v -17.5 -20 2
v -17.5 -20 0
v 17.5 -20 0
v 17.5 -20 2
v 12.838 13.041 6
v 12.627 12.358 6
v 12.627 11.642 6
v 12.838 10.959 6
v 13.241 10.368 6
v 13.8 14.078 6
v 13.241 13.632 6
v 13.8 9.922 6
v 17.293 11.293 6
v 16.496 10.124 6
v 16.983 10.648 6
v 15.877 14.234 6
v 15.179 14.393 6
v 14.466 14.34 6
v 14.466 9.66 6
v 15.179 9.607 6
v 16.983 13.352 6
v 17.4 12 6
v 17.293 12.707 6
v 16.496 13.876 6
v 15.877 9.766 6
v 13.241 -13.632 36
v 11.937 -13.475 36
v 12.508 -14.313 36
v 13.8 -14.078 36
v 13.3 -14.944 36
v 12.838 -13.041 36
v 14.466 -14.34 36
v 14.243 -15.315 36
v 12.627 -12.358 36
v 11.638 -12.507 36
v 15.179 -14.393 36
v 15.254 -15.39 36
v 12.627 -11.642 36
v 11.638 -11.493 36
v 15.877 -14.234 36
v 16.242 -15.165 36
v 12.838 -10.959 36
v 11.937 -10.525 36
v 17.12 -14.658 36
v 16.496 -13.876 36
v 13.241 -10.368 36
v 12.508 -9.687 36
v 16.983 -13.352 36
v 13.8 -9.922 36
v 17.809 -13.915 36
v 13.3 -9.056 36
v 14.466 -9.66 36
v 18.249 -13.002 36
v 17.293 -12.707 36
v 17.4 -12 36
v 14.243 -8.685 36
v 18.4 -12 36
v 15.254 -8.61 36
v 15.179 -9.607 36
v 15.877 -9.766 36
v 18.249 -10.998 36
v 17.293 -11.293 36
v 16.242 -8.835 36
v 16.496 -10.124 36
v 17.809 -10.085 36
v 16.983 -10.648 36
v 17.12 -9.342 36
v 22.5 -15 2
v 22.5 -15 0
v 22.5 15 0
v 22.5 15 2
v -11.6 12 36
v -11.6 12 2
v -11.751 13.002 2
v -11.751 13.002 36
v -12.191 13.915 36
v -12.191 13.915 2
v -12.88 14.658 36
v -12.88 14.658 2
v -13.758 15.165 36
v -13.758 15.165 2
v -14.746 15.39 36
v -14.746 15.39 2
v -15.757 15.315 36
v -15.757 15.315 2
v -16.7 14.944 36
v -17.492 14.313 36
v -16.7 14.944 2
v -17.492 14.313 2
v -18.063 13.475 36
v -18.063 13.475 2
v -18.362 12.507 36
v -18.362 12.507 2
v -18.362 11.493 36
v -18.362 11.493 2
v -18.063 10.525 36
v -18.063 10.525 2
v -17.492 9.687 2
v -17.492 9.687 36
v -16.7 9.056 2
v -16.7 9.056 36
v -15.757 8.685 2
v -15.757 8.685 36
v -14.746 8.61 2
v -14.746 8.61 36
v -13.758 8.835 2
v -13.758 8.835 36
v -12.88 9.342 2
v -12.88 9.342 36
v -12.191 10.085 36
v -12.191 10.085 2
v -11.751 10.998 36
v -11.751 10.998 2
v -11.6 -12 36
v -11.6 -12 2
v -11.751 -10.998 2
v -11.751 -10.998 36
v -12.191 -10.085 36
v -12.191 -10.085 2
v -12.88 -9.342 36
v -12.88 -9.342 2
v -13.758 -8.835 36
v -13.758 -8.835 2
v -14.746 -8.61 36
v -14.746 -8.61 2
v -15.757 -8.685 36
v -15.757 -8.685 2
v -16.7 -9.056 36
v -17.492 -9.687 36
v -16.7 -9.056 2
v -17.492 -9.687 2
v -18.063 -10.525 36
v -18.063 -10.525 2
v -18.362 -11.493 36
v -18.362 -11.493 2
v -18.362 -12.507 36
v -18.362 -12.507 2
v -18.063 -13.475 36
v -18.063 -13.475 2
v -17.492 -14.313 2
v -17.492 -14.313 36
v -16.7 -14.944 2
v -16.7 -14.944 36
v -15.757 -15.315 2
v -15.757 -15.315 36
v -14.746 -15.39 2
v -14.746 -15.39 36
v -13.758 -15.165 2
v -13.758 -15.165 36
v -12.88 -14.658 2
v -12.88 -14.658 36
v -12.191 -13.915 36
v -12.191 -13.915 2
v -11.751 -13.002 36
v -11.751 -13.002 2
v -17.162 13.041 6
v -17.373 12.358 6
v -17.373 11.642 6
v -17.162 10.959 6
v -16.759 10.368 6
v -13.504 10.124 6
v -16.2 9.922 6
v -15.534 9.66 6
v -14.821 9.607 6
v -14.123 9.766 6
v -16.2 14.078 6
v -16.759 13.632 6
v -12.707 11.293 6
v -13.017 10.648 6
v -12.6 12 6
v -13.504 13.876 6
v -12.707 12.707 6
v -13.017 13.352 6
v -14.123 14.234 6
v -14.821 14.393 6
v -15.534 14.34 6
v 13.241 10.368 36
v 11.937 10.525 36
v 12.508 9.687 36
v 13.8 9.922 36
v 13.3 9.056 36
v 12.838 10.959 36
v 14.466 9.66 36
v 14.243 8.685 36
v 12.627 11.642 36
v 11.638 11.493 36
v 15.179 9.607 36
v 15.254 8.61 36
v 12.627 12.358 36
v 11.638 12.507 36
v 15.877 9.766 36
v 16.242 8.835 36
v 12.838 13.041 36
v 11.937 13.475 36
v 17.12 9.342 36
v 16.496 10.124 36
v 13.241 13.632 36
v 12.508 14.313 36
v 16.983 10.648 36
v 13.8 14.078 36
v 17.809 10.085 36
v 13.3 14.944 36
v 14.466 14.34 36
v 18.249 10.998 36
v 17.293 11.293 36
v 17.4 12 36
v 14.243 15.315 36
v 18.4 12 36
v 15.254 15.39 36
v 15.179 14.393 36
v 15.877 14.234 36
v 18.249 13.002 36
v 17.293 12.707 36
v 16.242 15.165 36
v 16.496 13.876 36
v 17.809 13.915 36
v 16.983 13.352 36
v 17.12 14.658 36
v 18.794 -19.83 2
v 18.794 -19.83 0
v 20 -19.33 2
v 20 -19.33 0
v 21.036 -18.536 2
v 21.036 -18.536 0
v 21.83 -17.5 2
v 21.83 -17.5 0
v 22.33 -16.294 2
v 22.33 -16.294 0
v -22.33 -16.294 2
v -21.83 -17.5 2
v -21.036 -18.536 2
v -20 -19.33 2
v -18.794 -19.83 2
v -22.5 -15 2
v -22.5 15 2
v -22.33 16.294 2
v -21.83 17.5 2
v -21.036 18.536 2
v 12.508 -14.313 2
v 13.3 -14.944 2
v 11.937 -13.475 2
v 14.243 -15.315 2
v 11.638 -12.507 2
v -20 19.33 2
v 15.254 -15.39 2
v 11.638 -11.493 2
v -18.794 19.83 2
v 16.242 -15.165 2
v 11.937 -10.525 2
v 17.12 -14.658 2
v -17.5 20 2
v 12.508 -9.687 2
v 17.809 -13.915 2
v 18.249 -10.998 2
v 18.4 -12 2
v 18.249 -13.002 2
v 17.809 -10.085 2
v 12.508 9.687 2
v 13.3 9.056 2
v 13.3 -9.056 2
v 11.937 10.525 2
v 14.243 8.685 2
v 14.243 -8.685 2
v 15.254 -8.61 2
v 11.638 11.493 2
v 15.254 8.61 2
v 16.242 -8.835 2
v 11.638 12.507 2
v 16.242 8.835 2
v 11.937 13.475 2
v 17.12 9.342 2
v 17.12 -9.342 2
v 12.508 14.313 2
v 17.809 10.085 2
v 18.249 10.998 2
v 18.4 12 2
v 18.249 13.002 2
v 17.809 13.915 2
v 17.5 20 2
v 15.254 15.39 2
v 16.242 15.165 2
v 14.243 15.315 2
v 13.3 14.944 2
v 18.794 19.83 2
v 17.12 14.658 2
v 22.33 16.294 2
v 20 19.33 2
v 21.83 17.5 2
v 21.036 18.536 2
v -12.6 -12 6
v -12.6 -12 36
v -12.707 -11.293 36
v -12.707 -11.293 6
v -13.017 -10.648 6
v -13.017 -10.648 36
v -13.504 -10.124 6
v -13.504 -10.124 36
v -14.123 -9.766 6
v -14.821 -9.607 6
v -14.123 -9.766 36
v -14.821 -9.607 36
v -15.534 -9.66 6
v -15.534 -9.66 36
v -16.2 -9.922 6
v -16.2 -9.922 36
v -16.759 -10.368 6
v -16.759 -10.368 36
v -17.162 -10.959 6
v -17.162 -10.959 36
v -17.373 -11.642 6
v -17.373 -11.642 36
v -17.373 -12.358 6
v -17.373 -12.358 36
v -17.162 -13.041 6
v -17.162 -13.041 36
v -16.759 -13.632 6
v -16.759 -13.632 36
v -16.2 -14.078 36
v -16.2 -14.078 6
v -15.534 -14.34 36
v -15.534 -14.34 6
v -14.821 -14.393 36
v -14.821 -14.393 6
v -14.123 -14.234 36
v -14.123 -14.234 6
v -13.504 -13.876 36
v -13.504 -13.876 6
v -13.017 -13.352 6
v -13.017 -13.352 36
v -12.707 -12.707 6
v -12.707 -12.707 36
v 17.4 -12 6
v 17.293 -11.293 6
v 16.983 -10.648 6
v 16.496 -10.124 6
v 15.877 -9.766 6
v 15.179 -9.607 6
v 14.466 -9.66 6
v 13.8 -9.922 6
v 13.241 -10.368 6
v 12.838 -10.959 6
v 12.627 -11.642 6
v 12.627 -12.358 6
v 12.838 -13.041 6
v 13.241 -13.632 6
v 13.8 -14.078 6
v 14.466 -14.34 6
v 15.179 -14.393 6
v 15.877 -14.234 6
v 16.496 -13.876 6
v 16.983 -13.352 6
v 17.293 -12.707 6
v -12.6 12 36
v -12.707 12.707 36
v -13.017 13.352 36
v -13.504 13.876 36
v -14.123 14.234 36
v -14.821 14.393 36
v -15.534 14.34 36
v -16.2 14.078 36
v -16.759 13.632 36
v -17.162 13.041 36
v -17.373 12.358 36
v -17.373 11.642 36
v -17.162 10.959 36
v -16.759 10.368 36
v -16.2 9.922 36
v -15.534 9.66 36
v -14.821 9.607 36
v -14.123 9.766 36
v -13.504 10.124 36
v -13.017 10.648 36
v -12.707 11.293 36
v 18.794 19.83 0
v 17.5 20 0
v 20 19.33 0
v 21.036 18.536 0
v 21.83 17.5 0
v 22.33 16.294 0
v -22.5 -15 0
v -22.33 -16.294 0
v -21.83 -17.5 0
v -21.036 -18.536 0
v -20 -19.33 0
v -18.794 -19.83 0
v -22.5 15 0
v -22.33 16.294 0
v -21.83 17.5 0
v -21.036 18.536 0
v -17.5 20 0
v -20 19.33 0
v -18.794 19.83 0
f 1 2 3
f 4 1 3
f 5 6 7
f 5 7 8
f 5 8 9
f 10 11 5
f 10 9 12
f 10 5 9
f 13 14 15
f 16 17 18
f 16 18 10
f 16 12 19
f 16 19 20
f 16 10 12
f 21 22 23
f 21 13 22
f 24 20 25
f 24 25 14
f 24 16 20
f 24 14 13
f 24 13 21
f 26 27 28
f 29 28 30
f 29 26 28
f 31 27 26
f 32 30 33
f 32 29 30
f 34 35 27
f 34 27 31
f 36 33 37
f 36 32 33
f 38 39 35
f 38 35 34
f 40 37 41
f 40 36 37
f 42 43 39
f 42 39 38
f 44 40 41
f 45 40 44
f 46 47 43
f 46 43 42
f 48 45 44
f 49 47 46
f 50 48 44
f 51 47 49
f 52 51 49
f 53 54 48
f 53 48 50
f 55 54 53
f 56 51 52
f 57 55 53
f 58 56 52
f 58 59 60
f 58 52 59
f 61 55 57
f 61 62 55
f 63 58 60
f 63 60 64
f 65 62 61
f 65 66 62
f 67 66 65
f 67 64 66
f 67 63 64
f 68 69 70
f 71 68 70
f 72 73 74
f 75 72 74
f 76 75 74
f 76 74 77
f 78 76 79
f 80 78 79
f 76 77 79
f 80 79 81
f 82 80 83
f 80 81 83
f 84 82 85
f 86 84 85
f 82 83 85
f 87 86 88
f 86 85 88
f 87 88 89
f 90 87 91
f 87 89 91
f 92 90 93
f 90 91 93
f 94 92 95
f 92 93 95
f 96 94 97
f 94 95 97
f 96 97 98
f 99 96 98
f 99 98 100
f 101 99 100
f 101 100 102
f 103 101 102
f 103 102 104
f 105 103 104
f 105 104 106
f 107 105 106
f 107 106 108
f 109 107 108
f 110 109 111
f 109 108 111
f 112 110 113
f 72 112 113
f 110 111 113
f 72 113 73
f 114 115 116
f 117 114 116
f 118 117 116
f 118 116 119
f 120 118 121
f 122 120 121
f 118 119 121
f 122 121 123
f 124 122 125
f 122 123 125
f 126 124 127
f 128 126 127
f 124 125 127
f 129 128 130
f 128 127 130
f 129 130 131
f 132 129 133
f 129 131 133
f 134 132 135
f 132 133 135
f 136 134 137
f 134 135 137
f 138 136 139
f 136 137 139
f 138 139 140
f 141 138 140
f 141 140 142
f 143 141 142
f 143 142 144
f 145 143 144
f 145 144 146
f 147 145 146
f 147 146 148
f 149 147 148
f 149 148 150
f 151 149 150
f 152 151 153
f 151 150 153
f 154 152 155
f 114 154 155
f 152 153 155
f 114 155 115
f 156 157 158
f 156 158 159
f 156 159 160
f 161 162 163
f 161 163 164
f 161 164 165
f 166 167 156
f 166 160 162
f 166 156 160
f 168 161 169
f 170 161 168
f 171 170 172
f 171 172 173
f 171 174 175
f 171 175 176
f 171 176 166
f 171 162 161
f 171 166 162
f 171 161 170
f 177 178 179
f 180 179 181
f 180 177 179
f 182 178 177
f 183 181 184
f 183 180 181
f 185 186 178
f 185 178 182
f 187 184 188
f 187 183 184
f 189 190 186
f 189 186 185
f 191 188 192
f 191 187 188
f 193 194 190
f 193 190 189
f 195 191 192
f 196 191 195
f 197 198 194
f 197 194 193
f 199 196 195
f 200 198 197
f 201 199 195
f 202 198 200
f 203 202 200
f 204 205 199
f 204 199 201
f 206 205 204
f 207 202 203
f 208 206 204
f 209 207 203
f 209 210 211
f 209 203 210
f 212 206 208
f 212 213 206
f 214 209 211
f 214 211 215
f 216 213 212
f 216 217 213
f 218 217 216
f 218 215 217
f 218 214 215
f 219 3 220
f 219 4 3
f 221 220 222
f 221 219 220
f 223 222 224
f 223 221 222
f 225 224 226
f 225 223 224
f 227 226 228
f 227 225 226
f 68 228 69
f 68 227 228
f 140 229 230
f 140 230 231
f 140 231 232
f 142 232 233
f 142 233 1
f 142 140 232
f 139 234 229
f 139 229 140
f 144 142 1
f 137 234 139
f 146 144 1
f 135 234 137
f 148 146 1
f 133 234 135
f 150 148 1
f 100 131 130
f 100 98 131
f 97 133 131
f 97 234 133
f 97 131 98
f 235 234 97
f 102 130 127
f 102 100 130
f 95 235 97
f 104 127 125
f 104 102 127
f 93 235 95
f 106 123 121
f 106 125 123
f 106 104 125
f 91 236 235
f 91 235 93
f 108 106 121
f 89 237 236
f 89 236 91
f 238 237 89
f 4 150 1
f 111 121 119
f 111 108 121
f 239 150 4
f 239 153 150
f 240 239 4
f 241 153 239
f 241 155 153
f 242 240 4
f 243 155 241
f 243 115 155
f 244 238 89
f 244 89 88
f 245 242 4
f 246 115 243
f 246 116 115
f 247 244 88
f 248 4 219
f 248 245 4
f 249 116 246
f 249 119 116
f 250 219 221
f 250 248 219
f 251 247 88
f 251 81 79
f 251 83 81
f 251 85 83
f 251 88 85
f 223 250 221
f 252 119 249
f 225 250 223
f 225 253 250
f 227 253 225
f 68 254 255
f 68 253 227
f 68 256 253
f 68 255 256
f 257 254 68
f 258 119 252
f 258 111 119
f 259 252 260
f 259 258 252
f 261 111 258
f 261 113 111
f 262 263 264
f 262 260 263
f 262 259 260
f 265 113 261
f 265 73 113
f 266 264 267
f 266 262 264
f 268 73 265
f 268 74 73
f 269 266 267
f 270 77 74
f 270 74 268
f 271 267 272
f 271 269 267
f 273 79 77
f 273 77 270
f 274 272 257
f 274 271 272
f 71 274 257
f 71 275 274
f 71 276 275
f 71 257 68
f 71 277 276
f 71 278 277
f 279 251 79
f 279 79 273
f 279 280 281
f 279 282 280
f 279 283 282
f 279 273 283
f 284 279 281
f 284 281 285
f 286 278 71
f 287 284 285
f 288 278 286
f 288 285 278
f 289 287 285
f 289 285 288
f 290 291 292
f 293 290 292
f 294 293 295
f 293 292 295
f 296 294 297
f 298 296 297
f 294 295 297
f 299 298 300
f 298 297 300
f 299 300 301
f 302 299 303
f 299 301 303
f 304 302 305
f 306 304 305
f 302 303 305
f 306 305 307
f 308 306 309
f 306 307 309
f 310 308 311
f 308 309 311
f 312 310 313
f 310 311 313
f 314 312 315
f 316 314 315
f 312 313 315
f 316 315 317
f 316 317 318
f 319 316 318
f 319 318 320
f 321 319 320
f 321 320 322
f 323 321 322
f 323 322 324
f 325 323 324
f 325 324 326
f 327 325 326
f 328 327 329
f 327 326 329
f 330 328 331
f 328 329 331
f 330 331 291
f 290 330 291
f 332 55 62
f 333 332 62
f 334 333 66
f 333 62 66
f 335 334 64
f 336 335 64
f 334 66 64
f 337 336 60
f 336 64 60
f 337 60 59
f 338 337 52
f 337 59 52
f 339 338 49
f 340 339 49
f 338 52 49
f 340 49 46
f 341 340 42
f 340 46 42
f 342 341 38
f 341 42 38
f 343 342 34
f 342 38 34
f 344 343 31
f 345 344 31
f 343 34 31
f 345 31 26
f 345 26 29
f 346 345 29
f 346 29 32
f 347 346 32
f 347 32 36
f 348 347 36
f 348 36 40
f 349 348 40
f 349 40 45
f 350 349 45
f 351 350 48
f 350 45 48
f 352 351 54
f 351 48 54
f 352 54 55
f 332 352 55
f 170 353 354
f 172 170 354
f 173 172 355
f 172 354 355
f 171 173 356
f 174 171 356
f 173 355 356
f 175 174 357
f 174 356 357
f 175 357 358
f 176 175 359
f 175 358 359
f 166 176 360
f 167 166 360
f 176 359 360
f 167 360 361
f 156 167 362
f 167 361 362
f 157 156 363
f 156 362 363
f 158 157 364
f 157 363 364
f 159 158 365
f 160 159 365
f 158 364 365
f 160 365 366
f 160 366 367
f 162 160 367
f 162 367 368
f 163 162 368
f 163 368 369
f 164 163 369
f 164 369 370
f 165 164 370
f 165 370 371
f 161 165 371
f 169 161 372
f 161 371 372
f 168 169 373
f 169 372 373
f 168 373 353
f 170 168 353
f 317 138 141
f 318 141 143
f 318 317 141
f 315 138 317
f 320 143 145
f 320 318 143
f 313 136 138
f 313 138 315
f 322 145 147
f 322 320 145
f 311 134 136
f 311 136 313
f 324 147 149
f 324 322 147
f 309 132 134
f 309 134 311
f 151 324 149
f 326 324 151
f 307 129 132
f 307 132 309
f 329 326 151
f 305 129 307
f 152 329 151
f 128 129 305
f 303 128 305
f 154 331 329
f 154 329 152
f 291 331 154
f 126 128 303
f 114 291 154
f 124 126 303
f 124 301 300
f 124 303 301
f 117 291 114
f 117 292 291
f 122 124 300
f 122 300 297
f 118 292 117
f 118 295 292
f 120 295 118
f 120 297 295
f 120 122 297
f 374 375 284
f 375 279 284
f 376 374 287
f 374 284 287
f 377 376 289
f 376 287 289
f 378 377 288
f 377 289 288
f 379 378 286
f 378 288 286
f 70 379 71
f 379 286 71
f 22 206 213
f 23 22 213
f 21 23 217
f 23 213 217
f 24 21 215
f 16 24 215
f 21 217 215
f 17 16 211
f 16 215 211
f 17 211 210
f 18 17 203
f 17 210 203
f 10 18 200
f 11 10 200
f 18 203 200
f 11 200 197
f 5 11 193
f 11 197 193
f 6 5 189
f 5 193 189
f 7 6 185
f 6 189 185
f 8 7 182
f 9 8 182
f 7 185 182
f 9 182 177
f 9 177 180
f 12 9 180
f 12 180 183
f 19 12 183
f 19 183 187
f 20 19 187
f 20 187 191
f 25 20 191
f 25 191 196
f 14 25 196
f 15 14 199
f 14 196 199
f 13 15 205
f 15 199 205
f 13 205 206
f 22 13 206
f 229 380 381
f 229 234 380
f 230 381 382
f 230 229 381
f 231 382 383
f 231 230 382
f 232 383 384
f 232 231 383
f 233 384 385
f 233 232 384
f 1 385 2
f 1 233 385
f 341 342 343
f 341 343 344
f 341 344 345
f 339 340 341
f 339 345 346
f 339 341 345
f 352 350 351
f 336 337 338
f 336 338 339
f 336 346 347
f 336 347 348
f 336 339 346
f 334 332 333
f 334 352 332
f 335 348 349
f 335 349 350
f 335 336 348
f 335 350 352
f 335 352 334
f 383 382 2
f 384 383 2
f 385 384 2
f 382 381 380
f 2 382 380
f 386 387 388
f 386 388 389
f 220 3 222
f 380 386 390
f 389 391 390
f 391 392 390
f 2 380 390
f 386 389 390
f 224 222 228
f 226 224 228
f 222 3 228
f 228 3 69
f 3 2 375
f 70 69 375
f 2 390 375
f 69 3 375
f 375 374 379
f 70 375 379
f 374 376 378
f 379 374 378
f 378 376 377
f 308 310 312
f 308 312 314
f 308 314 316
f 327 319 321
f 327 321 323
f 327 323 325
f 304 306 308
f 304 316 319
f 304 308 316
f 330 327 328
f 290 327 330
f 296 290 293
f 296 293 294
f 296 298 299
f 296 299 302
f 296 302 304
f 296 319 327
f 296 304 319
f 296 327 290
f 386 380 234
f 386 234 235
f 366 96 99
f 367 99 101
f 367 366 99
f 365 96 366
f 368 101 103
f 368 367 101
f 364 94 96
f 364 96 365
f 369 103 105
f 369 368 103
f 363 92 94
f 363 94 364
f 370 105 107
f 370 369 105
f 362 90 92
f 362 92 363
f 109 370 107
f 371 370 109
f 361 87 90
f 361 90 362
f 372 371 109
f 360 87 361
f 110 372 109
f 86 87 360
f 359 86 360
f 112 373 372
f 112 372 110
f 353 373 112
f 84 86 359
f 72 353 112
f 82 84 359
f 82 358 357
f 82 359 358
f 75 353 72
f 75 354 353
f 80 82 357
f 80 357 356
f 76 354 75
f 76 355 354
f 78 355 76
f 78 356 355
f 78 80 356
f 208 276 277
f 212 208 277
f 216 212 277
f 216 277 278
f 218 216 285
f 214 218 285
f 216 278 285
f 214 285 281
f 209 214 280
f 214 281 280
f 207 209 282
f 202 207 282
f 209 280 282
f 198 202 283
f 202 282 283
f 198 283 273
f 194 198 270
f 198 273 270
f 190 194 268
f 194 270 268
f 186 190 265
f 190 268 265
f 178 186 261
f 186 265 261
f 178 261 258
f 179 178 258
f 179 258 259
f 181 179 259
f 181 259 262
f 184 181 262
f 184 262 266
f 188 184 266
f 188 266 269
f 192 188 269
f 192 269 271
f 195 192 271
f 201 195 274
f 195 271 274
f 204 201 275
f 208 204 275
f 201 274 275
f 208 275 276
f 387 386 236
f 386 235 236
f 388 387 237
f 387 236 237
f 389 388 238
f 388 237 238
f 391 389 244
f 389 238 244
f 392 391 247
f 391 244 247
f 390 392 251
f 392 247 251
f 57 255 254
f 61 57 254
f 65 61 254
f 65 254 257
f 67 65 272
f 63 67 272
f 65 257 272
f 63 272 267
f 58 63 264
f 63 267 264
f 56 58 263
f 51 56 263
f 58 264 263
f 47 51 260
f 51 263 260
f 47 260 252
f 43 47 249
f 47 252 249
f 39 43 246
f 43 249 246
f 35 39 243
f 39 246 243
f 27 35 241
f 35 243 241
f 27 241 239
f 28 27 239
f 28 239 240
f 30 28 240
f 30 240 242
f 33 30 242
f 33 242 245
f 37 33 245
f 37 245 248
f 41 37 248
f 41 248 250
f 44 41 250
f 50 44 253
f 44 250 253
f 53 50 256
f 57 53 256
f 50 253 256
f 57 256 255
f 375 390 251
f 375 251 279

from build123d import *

# Parameters (mm, degrees)
F0_W     = 45
F0_H     = 40
F1_DEPTH = 2
F2_R     = 3.4
F3_DEPTH = 34
F4_R     = 2.4
F5_DEPTH = 30
F6_R     = 5


with BuildPart() as f1:
    # F0 (on Top) → F1 (new body)
    with BuildSketch(Plane.XY):
        Rectangle(F0_W, F0_H)
    extrude(amount=F1_DEPTH)

    # F2 (on face) → F3 (join)
    with BuildSketch(Plane.XY.offset(2)):
        with Locations((-15, 12)):
            Circle(F2_R)
        with Locations((15, 12)):
            Circle(F2_R)
        with Locations((15, -12)):
            Circle(F2_R)
        with Locations((-15, -12)):
            Circle(F2_R)
    extrude(amount=F3_DEPTH)

    # F4 (on face) → F5 (cut)
    with BuildSketch(Plane.XY.offset(36)):
        with Locations((-15, 12)):
            Circle(F4_R)
        with Locations((15, 12)):
            Circle(F4_R)
        with Locations((15, -12)):
            Circle(F4_R)
        with Locations((-15, -12)):
            Circle(F4_R)
    extrude(amount=-F5_DEPTH, mode=Mode.SUBTRACT)

    # F6
    f6_edges = [f1.edges().sort_by_distance(p)[0] for p in [
        (-22.5, -20, 1),
        (22.5, -20, 1),
        (22.5, 20, 1),
        (-22.5, 20, 1),
    ]]
    fillet(f6_edges, radius=F6_R)


solid = f1.part
